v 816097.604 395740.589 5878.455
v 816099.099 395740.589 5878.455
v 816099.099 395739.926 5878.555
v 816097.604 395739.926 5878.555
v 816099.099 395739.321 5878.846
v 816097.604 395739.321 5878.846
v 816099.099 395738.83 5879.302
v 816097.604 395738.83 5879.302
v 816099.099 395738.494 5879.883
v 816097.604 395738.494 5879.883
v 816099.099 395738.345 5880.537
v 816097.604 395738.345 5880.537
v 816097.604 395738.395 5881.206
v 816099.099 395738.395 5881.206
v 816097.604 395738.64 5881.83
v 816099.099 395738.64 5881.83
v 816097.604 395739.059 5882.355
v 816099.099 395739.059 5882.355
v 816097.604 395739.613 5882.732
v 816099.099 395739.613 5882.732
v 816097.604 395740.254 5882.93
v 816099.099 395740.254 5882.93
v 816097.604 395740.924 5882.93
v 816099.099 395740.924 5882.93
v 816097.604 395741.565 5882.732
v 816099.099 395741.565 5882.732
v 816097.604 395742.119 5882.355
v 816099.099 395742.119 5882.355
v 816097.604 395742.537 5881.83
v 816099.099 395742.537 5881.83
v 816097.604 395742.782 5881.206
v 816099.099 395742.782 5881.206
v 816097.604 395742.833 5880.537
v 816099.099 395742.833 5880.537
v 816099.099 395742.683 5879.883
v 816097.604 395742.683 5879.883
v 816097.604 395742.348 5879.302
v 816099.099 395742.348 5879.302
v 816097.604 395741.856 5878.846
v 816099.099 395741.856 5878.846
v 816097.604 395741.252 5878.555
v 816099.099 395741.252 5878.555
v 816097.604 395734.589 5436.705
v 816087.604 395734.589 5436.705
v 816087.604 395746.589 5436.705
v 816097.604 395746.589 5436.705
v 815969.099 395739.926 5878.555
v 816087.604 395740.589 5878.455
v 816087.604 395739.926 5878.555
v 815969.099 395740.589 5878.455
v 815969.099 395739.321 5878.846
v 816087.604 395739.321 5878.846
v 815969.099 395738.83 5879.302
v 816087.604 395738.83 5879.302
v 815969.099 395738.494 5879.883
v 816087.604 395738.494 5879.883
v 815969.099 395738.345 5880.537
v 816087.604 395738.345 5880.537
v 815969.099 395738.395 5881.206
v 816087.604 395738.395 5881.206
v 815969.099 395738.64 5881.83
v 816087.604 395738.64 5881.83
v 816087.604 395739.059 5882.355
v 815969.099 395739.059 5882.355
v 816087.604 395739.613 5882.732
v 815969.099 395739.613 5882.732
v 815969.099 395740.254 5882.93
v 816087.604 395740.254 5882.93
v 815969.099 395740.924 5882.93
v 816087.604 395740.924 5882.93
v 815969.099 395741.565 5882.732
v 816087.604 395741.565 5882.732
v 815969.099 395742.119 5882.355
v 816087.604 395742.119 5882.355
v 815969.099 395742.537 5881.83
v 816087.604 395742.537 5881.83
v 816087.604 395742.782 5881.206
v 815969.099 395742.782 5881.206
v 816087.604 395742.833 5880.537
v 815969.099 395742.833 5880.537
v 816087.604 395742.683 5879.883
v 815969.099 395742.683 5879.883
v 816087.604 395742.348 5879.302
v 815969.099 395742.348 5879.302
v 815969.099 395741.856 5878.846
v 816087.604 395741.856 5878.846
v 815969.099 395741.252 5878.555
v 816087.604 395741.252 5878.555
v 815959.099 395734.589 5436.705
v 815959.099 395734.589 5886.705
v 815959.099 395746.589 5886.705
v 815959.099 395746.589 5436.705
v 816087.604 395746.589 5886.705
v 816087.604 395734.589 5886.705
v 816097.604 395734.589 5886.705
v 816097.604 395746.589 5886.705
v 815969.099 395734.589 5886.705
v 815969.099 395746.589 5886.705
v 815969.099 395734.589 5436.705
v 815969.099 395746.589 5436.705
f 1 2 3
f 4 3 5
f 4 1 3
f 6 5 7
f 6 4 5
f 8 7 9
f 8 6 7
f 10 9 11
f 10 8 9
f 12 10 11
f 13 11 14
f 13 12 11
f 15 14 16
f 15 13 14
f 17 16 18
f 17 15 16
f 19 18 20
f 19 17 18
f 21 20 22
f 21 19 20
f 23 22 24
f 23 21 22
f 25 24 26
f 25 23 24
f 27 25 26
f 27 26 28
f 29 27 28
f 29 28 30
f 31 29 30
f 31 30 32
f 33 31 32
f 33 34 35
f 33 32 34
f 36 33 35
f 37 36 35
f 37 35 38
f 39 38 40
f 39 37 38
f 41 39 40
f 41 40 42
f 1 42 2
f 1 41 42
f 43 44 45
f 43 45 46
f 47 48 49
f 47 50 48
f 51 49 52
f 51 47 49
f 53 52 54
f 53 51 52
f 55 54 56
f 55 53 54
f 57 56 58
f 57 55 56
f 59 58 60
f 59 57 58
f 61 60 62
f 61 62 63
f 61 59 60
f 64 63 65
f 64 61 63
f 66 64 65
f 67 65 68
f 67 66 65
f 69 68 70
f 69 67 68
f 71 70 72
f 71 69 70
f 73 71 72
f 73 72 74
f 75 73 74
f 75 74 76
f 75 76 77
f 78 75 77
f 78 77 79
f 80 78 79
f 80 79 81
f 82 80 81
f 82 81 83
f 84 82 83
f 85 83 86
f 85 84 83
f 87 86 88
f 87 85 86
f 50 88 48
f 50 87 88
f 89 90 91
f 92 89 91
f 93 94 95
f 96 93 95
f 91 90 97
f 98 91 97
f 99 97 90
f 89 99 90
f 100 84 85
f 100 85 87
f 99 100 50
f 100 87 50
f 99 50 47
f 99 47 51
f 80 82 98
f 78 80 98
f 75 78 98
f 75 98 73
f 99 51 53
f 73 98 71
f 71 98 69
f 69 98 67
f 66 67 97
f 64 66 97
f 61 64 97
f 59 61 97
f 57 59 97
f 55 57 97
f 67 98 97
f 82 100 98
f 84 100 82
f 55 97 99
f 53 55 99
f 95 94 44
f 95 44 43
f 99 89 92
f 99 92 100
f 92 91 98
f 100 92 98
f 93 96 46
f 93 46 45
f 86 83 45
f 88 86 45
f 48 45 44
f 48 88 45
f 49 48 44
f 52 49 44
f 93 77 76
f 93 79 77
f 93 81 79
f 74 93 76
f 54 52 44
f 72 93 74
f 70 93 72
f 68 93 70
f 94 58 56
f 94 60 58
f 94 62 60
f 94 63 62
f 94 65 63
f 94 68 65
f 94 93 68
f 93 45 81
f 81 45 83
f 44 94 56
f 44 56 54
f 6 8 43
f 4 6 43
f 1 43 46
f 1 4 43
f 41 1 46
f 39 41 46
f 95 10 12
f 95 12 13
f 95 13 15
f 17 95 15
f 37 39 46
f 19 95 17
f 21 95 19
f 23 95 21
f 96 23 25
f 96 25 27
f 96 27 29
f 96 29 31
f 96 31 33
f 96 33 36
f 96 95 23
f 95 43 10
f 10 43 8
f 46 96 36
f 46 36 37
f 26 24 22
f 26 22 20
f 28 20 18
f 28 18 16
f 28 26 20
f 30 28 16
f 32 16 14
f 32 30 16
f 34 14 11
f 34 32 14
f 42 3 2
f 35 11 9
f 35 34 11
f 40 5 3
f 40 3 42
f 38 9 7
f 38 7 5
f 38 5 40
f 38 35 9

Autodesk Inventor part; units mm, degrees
ref_plane "YZ Plane" through (0, 0, 0) normal (1, 0, 0) x (0, 1, 0)
ref_plane "XZ Plane" through (0, 0, 0) normal (0, 1, 0) x (-1, 0, 0)
ref_plane "XY Plane" through (0, 0, 0) normal (0, 0, 1) x (1, 0, 0)
ref_plane "Work Plane1" through (816103.6043, 395739.5889, 5886.7052) normal (0, 0, 1) x (1, 0, 0)
sketch "Sketch1" plane through (816103.6043, 395739.5889, 5886.7052) normal (0, 0, 1) x (1, 0, 0)
  line L0 (-6, 7) -> (-16, 7)
  line L1 (-16, 7) -> (-16, -5)
  line L2 (-16, -5) -> (-6, -5)
  line L3 (-6, -5) -> (-6, 7)
  line L4 (-144.5049, 7) -> (-134.5049, 7)
  line L5 (-134.5049, 7) -> (-134.5049, -5)
  line L6 (-134.5049, -5) -> (-144.5049, -5)
  line L7 (-144.5049, -5) -> (-144.5049, 7)
  point P0 (-816103.6043, -395739.5889)
  dimension "d0" = 10
  dimension "d1" = 12
  dimension "d2" = 10
  dimension "d3" = 12
extrude "Extrusion1" add sketch "Sketch1" against normal blind 450
sketch "Sketch2" plane through (815969.0994, 395734.5889, 5886.7052) normal (1, 0, 0) x (0, 0, -1)
  circle A0 centre (6, 6) radius 2.25
  point P0 (5886.7052, -395734.5889)
  dimension "d6" = 4.5
extrude "Extrusion2" add sketch "Sketch2" along normal blind 130
properties part number "antebrazo"
